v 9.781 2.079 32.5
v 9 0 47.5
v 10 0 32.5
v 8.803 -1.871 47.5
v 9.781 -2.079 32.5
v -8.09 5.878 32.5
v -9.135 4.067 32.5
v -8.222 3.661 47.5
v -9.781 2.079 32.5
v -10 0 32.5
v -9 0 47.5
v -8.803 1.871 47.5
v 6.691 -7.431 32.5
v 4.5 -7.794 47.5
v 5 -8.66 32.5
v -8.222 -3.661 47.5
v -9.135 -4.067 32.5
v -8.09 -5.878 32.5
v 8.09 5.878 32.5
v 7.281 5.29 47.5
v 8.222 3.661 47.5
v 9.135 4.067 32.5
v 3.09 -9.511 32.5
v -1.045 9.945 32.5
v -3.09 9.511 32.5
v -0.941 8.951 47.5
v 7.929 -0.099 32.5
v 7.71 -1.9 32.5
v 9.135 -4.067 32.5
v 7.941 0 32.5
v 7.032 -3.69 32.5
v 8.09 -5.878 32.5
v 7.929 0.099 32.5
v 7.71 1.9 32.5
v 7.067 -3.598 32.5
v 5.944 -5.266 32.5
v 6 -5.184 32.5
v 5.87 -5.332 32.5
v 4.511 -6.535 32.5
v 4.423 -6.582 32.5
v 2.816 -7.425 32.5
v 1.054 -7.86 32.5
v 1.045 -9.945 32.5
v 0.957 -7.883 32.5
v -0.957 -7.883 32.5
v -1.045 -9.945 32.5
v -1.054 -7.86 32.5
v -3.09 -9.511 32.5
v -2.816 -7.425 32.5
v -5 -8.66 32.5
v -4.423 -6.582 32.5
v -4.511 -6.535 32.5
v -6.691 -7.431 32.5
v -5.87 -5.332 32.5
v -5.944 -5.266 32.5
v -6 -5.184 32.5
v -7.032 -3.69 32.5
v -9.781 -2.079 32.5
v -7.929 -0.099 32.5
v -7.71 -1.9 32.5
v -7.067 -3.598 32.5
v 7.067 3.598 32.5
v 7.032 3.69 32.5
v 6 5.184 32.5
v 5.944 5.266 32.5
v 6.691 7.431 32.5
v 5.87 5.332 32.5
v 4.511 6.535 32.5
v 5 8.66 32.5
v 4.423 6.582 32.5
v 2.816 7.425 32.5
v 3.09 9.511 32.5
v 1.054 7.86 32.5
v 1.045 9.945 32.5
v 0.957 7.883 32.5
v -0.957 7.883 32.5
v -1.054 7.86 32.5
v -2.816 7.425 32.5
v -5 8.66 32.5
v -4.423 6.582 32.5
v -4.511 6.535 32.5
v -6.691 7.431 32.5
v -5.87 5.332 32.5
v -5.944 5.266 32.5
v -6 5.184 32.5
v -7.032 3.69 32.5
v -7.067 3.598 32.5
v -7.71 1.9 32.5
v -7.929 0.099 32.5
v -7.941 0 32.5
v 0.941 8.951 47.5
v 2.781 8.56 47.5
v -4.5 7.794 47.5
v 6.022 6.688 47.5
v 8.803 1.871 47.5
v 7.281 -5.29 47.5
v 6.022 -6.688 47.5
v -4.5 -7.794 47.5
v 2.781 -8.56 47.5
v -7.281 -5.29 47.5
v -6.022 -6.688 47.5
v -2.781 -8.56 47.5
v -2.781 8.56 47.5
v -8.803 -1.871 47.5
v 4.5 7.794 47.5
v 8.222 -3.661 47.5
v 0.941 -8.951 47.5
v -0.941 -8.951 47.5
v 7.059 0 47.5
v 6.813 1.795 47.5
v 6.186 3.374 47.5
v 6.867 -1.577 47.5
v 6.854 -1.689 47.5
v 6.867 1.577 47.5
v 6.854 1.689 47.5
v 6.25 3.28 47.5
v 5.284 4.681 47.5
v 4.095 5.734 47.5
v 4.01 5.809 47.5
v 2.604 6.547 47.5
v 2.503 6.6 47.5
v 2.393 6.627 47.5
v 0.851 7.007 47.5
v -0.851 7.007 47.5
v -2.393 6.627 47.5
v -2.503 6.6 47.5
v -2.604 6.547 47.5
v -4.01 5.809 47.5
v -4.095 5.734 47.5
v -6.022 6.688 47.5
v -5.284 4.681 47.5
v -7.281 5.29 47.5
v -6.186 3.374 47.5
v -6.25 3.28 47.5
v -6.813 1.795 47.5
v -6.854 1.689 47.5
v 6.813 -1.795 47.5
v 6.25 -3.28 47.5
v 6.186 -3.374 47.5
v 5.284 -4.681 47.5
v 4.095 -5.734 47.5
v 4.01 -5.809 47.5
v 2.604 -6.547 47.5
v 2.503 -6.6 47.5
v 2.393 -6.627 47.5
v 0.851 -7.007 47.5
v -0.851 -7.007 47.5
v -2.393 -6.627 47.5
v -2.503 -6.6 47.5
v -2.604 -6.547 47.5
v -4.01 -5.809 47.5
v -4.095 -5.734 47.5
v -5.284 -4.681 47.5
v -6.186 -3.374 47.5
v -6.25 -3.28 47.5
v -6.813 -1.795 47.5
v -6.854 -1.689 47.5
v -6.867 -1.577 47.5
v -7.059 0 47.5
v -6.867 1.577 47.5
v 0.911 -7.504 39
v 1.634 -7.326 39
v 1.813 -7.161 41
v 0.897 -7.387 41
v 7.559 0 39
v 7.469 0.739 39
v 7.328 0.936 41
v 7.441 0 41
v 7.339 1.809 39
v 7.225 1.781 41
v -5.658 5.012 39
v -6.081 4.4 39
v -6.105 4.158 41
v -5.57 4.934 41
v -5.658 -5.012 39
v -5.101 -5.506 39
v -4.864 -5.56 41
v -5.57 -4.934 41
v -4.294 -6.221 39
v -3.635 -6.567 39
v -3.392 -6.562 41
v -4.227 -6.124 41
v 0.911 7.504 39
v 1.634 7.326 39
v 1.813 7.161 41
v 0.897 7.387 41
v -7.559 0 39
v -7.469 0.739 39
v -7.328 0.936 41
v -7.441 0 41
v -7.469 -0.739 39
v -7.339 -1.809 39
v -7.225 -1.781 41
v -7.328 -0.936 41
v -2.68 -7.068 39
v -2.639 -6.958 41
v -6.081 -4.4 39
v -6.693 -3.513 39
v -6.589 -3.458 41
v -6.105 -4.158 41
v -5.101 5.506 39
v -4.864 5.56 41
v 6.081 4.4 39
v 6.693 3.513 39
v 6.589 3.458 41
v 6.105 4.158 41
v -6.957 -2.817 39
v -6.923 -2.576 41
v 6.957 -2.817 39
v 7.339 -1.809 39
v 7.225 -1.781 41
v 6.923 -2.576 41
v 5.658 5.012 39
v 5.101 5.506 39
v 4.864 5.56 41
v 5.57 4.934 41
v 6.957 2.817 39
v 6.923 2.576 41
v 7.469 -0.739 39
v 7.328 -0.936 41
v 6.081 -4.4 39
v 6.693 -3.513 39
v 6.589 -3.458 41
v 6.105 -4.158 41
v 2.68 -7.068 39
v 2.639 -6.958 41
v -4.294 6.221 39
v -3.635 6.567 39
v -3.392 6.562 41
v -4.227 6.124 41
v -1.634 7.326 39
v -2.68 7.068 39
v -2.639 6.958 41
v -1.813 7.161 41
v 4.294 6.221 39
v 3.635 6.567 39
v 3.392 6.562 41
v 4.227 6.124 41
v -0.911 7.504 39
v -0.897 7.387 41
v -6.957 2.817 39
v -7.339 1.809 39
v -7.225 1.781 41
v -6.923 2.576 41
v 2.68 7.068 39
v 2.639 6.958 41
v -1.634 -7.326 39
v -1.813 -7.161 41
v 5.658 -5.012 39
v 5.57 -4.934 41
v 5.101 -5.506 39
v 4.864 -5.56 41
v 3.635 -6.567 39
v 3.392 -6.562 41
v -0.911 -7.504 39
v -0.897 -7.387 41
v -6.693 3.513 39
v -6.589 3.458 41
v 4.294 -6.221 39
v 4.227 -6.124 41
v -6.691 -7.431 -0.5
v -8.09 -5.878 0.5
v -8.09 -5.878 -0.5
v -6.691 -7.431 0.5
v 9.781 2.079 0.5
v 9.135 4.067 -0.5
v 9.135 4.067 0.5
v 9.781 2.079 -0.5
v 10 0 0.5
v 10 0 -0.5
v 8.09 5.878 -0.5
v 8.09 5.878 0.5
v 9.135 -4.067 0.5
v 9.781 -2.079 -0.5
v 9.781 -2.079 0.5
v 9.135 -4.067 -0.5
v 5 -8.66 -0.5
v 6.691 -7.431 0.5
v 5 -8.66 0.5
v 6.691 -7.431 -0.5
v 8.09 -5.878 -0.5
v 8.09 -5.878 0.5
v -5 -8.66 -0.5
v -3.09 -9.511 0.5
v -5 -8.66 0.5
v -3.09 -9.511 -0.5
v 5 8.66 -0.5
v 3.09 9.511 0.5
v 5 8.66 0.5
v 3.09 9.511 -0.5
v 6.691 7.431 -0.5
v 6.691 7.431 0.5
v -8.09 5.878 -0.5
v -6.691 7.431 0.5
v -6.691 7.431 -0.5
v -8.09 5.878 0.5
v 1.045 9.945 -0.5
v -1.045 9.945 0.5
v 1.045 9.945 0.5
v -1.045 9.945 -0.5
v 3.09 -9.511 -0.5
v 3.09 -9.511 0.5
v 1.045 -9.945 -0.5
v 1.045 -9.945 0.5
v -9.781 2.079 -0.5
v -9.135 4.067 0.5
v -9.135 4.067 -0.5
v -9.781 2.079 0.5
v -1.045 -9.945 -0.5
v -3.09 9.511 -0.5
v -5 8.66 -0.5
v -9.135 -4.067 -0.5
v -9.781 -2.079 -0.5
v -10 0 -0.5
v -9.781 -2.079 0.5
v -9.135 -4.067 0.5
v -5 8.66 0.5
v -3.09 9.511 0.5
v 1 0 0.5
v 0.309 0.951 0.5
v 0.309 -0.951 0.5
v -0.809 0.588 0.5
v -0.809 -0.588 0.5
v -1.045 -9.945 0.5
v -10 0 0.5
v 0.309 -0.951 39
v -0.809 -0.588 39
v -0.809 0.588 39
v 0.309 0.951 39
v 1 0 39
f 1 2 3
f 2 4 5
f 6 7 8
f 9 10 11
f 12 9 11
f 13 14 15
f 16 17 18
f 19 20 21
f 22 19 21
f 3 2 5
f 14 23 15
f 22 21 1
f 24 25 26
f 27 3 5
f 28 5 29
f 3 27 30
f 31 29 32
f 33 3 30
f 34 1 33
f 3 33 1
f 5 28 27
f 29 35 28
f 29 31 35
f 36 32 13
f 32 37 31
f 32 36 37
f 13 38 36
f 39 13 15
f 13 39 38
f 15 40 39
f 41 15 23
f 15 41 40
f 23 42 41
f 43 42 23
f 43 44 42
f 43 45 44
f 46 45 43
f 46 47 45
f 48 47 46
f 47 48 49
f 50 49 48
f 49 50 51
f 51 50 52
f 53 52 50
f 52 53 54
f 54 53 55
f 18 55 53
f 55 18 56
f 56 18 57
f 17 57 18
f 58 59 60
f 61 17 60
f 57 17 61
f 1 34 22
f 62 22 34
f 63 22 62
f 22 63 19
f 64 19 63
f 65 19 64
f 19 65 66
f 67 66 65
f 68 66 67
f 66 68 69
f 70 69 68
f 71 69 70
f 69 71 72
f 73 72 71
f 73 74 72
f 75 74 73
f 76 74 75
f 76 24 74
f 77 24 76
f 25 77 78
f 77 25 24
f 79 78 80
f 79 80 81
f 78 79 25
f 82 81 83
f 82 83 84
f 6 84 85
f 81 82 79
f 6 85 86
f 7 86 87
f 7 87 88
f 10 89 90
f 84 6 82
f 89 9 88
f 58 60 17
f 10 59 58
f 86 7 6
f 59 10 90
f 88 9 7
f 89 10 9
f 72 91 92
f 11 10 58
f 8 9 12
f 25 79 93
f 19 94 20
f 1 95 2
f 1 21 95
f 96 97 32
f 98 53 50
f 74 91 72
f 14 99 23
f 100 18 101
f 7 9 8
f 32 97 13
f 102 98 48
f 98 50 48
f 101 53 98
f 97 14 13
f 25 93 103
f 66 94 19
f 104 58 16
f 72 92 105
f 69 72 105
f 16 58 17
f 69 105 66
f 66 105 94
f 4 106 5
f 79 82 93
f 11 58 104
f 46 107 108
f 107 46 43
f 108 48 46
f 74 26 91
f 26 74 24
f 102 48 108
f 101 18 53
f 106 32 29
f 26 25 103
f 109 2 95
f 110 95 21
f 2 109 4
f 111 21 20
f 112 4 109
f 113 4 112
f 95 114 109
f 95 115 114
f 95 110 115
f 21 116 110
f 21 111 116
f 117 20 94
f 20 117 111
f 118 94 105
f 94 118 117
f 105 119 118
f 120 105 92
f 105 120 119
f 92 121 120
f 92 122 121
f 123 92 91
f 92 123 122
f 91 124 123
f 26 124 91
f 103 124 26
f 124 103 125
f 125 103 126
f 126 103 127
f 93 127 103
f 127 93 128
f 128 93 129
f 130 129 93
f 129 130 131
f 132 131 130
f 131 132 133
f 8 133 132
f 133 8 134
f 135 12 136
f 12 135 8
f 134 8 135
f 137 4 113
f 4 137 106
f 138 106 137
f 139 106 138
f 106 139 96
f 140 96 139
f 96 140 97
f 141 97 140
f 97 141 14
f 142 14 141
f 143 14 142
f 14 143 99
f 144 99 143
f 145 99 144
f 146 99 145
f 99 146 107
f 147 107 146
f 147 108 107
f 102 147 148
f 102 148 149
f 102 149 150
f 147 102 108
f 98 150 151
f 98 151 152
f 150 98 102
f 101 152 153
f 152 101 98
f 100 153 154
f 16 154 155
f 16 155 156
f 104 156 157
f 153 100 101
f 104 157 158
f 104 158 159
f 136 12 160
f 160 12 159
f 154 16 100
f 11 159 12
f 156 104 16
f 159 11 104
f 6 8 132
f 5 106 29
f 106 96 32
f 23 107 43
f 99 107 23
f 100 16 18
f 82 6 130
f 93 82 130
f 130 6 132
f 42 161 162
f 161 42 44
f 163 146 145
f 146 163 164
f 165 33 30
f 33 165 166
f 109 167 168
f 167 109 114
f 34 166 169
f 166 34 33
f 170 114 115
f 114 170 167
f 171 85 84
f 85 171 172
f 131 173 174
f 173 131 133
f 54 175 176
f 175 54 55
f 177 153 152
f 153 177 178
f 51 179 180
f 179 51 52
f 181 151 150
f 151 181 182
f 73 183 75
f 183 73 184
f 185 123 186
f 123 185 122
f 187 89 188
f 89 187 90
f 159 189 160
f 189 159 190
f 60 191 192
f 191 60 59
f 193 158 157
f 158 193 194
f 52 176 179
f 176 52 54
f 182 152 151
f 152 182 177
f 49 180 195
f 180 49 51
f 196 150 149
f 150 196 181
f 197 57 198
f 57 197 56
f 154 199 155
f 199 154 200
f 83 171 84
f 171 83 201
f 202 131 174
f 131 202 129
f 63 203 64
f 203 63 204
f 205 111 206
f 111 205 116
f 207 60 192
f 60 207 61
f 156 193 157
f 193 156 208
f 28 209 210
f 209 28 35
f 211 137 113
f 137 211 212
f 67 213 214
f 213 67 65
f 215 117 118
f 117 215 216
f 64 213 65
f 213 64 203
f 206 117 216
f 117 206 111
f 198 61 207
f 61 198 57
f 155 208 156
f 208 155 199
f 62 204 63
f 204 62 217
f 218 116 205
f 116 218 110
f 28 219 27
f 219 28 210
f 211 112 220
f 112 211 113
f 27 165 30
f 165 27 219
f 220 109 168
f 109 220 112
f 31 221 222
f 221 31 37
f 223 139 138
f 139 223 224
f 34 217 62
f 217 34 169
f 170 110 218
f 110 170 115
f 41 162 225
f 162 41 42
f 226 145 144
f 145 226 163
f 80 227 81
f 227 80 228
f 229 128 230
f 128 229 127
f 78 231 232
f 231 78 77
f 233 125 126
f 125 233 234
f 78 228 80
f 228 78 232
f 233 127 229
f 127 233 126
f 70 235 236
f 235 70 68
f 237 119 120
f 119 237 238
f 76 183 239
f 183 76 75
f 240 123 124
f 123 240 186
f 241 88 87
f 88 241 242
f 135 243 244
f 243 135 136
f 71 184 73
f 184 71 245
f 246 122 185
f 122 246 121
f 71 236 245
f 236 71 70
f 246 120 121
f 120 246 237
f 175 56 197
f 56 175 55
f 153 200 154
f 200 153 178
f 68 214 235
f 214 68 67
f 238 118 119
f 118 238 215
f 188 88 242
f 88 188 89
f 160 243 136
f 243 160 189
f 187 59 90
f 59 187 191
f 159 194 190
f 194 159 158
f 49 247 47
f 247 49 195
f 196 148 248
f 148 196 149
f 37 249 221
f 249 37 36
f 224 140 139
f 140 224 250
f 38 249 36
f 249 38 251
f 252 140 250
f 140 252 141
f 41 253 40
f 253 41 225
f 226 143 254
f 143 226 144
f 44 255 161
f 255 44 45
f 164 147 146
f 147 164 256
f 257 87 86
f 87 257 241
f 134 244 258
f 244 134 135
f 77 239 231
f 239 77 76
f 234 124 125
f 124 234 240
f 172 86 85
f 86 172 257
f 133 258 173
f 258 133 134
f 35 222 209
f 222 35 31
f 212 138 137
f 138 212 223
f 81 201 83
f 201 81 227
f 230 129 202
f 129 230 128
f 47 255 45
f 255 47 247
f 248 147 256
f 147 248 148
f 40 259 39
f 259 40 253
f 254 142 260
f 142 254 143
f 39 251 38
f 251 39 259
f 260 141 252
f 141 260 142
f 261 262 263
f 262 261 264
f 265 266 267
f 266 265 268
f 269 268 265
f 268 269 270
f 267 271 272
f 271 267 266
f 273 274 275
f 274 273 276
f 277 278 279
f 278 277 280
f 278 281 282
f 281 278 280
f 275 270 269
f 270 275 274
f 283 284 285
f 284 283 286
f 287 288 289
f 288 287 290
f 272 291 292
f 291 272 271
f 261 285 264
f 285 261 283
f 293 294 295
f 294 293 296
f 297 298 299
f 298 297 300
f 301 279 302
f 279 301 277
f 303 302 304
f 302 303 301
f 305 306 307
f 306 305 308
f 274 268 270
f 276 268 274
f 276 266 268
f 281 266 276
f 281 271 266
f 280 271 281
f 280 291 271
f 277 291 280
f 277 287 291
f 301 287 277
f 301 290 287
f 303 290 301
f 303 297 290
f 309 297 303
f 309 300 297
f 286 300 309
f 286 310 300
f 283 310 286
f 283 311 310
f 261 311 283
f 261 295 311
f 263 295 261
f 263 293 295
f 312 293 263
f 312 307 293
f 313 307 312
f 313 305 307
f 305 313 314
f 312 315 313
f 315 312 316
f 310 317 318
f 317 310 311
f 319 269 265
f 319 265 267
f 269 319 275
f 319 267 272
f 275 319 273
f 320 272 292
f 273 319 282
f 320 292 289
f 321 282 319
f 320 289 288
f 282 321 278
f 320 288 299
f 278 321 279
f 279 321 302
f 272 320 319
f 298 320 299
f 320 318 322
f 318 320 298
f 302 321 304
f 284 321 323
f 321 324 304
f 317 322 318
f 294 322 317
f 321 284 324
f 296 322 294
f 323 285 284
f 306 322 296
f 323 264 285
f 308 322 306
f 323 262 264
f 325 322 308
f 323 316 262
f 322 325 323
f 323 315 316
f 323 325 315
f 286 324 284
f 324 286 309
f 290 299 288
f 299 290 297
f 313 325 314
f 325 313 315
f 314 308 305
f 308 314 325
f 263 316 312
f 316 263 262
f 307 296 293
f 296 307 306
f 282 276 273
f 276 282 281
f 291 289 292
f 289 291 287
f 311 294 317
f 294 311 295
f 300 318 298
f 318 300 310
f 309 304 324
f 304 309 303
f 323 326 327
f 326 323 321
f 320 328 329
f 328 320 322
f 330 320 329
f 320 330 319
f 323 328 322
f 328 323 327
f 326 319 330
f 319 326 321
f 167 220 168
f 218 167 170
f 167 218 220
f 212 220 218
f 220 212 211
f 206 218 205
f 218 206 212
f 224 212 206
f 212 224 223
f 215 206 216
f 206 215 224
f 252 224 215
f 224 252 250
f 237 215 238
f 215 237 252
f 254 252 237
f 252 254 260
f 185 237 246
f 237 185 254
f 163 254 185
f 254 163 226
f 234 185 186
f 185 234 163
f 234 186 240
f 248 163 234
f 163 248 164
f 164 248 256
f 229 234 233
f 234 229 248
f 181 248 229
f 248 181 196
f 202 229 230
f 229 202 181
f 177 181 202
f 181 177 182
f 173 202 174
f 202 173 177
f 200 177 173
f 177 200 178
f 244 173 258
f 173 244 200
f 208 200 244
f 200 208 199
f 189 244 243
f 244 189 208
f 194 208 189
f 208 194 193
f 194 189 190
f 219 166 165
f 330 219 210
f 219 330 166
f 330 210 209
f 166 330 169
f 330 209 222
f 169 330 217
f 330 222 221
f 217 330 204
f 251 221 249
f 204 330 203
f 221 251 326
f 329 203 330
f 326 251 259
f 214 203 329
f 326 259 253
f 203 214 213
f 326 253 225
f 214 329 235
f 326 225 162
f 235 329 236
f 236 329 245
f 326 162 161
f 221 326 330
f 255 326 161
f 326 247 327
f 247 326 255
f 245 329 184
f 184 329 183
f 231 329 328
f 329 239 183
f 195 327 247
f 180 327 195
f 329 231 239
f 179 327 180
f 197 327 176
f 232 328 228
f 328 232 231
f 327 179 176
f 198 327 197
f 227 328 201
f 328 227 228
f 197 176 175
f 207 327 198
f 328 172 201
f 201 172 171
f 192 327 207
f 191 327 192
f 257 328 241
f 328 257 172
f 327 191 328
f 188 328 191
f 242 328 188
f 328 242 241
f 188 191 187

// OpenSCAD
module Lamp_01(){

color("#c1cdcd")
cylinder(1,10,10, center= true);

color("#c1cdcd")
translate([0,0,20])
cylinder(40,1,1, center= true);

color("#ce5a57")
translate([0,0,40])
cylinder(2,8,8, center= true);



difference(){
color("#e47025")
translate([0,0,40])
cylinder(15,10,9, center= true);


color("#e47025")
translate([0,0,40])
cylinder(17,8,7, center= true);

}

}

Lamp_01();
